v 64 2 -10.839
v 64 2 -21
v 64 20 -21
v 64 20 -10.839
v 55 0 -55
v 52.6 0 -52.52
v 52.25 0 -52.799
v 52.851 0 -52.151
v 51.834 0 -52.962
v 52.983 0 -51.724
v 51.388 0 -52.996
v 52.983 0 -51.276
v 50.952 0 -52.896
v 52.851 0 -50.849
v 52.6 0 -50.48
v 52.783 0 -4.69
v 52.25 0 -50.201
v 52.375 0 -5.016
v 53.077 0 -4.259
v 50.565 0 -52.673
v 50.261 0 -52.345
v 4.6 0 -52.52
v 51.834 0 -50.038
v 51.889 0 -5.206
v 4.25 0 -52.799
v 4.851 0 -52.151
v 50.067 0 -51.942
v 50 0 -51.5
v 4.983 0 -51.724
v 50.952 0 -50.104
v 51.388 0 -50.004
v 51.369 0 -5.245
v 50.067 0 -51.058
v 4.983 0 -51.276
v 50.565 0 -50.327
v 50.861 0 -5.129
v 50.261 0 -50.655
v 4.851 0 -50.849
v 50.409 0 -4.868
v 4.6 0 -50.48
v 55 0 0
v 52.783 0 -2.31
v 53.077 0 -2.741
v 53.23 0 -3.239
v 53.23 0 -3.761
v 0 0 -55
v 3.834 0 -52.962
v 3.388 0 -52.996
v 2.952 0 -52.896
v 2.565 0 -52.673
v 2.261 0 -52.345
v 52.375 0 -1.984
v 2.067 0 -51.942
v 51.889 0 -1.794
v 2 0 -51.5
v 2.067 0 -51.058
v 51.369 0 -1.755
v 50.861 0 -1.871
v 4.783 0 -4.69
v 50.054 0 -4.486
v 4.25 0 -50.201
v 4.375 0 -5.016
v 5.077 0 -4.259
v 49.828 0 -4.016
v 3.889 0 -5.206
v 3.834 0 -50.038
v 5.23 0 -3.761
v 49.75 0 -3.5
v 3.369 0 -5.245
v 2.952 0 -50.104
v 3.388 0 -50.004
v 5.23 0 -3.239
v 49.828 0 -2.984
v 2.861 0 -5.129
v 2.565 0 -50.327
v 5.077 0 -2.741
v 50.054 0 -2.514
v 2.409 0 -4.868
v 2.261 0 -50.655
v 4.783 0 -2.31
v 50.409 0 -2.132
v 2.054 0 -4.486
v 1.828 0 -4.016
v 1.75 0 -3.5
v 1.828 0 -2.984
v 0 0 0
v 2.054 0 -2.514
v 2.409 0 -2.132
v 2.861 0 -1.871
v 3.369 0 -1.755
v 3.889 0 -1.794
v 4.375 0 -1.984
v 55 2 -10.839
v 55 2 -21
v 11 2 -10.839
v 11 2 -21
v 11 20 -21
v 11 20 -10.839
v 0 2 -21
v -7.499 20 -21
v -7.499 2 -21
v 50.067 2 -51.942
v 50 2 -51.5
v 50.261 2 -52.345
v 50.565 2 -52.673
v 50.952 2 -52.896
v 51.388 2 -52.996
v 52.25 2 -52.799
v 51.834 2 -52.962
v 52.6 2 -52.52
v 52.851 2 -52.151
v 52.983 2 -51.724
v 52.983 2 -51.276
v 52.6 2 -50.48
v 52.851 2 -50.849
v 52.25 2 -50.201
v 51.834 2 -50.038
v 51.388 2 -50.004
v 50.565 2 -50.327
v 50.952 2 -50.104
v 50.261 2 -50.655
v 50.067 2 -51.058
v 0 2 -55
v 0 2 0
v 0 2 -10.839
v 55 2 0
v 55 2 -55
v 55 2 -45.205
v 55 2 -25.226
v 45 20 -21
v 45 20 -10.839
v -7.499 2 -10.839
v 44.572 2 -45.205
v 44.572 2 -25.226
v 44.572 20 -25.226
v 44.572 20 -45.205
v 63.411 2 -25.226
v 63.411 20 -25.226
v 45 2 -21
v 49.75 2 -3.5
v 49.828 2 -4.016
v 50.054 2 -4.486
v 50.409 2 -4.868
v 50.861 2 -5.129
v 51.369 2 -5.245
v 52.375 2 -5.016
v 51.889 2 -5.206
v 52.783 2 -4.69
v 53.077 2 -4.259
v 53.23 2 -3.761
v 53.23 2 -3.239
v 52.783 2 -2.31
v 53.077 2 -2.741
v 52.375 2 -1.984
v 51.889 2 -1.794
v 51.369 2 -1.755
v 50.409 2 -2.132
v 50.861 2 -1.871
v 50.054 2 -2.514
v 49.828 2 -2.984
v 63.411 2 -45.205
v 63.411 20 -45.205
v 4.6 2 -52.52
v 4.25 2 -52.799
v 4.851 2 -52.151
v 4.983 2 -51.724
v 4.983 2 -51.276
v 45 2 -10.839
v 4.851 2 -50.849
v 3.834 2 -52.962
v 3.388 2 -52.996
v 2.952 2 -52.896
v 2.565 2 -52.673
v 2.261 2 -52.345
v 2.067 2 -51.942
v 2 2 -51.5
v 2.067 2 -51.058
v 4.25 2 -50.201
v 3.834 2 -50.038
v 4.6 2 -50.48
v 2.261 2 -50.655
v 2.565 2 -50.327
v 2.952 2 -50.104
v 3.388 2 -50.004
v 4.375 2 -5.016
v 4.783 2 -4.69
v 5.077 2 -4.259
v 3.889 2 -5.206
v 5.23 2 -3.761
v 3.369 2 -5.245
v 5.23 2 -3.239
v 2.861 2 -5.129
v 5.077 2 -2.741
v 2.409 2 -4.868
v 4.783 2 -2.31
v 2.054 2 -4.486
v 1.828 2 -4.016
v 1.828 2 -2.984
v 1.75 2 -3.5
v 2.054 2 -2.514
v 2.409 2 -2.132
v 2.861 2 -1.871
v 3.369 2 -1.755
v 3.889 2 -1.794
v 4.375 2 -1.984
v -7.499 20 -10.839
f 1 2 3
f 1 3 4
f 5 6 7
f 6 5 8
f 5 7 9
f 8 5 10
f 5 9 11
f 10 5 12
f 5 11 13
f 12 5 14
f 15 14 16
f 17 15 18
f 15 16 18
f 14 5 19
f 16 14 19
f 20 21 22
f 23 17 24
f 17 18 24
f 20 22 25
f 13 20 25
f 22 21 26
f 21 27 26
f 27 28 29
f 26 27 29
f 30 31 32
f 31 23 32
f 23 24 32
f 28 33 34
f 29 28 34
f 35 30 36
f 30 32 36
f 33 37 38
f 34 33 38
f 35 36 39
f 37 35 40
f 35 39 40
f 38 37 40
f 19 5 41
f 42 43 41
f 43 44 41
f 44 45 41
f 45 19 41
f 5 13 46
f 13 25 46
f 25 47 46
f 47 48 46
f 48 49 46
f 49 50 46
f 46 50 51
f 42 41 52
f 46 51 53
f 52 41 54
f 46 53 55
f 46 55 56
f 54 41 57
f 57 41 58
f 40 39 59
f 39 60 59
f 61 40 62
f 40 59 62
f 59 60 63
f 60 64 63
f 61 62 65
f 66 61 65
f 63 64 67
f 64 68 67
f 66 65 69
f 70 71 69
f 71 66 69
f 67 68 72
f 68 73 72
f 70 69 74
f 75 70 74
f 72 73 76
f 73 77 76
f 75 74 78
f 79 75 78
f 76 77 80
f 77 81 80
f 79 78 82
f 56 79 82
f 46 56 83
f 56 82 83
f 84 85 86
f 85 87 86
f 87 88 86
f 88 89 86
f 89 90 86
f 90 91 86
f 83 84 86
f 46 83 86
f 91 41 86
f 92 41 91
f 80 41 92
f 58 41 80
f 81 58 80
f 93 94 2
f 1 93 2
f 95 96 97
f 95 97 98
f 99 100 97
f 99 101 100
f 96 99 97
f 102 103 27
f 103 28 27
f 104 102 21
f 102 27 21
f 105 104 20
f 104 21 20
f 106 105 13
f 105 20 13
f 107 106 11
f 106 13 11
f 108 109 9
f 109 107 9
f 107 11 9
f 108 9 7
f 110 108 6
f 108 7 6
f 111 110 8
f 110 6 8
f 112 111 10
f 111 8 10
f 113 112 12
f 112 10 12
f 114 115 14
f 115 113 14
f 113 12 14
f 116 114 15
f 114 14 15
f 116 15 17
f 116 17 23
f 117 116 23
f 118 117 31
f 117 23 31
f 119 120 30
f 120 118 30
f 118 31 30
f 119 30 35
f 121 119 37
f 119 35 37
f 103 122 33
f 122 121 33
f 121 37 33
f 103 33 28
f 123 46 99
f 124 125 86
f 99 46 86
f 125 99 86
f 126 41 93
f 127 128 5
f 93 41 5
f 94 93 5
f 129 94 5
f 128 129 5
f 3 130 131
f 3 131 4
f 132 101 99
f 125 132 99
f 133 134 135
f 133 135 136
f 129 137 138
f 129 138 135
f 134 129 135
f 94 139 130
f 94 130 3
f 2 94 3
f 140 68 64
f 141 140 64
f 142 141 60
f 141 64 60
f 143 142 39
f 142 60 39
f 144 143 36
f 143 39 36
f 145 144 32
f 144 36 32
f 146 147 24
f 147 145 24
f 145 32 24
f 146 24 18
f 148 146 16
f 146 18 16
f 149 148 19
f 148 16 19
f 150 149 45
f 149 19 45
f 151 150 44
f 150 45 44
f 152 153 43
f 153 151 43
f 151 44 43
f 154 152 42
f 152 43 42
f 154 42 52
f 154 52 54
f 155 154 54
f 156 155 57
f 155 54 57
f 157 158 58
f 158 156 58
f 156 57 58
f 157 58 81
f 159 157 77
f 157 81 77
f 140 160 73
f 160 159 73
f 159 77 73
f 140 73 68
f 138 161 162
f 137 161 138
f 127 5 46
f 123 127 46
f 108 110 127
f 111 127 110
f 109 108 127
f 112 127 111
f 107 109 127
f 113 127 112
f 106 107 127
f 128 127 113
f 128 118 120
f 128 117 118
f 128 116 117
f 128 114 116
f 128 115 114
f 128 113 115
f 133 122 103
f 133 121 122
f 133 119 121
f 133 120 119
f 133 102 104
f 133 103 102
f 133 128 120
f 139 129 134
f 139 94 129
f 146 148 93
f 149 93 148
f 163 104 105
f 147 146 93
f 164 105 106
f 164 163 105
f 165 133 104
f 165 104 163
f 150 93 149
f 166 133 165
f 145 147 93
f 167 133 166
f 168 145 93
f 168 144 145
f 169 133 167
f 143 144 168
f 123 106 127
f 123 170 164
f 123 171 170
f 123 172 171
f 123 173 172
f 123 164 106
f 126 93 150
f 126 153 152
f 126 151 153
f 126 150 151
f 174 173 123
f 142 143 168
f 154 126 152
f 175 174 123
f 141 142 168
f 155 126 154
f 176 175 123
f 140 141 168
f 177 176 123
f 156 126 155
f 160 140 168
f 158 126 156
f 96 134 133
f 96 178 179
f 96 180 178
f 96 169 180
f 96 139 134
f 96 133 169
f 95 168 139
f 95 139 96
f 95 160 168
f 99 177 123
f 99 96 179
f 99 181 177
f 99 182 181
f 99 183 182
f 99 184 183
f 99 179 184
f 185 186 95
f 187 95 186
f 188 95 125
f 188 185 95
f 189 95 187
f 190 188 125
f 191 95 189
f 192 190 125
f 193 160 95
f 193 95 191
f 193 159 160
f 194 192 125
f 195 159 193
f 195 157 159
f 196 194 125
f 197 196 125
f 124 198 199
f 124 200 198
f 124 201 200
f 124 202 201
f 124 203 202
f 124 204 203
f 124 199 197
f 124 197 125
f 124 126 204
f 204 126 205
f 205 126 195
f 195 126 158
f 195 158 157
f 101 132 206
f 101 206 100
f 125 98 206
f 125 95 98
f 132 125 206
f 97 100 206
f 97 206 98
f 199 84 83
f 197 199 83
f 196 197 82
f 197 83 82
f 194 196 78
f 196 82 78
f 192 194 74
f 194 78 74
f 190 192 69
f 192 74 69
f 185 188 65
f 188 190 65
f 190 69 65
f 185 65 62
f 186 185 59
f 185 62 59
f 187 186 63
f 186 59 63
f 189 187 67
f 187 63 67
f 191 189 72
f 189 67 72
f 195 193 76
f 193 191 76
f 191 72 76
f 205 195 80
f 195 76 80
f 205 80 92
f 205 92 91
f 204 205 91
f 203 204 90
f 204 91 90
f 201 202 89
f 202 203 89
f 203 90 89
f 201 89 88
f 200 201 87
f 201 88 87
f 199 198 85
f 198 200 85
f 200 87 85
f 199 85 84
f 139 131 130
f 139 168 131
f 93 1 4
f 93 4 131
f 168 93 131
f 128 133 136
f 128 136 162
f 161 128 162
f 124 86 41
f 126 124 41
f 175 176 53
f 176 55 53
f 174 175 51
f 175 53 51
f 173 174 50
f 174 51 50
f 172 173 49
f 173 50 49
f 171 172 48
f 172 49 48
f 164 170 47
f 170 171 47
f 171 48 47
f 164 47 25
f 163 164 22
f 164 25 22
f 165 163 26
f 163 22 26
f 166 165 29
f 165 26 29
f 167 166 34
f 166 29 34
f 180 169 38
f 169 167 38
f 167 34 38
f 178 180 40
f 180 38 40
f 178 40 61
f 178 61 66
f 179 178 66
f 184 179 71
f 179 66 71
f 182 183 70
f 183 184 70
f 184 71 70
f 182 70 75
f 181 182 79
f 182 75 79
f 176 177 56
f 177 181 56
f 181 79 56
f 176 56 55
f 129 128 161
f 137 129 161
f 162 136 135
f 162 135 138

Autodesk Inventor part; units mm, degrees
ref_plane "YZ Plane" through (0, 0, 0) normal (1, 0, 0) x (0, 1, 0)
ref_plane "XZ Plane" through (0, 0, 0) normal (0, 1, 0) x (-1, 0, 0)
ref_plane "XY Plane" through (0, 0, 0) normal (0, 0, 1) x (1, 0, 0)
sketch "Sketch1" plane through (0, 0, 0) normal (0, 1, 0) x (-1, 0, 0)
  line L0 (0, 0) -> (-55, 0)
  line L1 (-55, 0) -> (-55, -55)
  line L2 (-55, -55) -> (0, -55)
  line L3 (0, -55) -> (0, 0)
  circle A0 centre (-3.5, -51.5) radius 1.5
  circle A1 centre (-51.5, -51.5) radius 1.5
  circle A2 centre (-3.5, -3.5) radius 1.75
  circle A3 centre (-51.5, -3.5) radius 1.75
  line L4 (-80.9711, 26.8887) -> (29.0289, 26.8887) construction
  line L5 (29.0289, 26.8887) -> (29.0289, -83.1113) construction
  line L6 (29.0289, -83.1113) -> (-80.9711, -83.1113) construction
  line L7 (-80.9711, -83.1113) -> (-80.9711, 26.8887) construction
  dimension "d1" = 55
  dimension "d4" = 55
  dimension "d49" = 3.5
  dimension "d50" = 3.5
  dimension "d51" = 3
  dimension "d54" = 3
  dimension "d55" = 3.5
  dimension "d56" = 3.5
  dimension "d59" = 3.5
  dimension "d60" = 3.5
  dimension "d61" = 3.5
  dimension "d62" = 3.5
  dimension "d63" = 3.5
  dimension "d64" = 3.5
  dimension "d90" = 110
extrude "Extrusion1" add sketch "Sketch1" along normal blind 2
sketch "Sketch4" plane through (0, 2, 0) normal (0, 1, 0) x (1, 0, 0)
  line L0 (-26.0558, 81.8781) -> (83.9442, 81.8781) construction
  line L1 (83.9442, 81.8781) -> (83.9442, -28.1219) construction
  line L2 (83.9442, -28.1219) -> (-26.0558, -28.1219) construction
  line L3 (-26.0558, -28.1219) -> (-26.0558, 81.8781) construction
  point P0 (0, 0)
  dimension "d77" = 110
sketch "Sketch5" plane through (0, 2, 0) normal (0, 1, 0) x (1, 0, 0)
  line L0 (44.5715, 45.2054) -> (63.4108, 45.2054)
  line L1 (63.4108, 45.2054) -> (63.4108, 25.2259)
  line L2 (63.4108, 25.2259) -> (44.5715, 25.2259)
  line L3 (44.5715, 25.2259) -> (44.5715, 45.2054)
  line L4 (45, 21) -> (64, 21)
  line L5 (64, 21) -> (64, 10.8389)
  line L6 (64, 10.8389) -> (45, 10.8389)
  line L7 (45, 10.8389) -> (45, 21)
  line L8 (-7.4993, 21) -> (11, 21)
  line L9 (11, 21) -> (11, 10.8389)
  line L10 (11, 10.8389) -> (-7.4993, 10.8389)
  line L11 (-7.4993, 10.8389) -> (-7.4993, 21)
  point P0 (0, 0)
extrude "Extrusion2" add sketch "Sketch5" along normal blind 18
properties part number "motorcontroller"
